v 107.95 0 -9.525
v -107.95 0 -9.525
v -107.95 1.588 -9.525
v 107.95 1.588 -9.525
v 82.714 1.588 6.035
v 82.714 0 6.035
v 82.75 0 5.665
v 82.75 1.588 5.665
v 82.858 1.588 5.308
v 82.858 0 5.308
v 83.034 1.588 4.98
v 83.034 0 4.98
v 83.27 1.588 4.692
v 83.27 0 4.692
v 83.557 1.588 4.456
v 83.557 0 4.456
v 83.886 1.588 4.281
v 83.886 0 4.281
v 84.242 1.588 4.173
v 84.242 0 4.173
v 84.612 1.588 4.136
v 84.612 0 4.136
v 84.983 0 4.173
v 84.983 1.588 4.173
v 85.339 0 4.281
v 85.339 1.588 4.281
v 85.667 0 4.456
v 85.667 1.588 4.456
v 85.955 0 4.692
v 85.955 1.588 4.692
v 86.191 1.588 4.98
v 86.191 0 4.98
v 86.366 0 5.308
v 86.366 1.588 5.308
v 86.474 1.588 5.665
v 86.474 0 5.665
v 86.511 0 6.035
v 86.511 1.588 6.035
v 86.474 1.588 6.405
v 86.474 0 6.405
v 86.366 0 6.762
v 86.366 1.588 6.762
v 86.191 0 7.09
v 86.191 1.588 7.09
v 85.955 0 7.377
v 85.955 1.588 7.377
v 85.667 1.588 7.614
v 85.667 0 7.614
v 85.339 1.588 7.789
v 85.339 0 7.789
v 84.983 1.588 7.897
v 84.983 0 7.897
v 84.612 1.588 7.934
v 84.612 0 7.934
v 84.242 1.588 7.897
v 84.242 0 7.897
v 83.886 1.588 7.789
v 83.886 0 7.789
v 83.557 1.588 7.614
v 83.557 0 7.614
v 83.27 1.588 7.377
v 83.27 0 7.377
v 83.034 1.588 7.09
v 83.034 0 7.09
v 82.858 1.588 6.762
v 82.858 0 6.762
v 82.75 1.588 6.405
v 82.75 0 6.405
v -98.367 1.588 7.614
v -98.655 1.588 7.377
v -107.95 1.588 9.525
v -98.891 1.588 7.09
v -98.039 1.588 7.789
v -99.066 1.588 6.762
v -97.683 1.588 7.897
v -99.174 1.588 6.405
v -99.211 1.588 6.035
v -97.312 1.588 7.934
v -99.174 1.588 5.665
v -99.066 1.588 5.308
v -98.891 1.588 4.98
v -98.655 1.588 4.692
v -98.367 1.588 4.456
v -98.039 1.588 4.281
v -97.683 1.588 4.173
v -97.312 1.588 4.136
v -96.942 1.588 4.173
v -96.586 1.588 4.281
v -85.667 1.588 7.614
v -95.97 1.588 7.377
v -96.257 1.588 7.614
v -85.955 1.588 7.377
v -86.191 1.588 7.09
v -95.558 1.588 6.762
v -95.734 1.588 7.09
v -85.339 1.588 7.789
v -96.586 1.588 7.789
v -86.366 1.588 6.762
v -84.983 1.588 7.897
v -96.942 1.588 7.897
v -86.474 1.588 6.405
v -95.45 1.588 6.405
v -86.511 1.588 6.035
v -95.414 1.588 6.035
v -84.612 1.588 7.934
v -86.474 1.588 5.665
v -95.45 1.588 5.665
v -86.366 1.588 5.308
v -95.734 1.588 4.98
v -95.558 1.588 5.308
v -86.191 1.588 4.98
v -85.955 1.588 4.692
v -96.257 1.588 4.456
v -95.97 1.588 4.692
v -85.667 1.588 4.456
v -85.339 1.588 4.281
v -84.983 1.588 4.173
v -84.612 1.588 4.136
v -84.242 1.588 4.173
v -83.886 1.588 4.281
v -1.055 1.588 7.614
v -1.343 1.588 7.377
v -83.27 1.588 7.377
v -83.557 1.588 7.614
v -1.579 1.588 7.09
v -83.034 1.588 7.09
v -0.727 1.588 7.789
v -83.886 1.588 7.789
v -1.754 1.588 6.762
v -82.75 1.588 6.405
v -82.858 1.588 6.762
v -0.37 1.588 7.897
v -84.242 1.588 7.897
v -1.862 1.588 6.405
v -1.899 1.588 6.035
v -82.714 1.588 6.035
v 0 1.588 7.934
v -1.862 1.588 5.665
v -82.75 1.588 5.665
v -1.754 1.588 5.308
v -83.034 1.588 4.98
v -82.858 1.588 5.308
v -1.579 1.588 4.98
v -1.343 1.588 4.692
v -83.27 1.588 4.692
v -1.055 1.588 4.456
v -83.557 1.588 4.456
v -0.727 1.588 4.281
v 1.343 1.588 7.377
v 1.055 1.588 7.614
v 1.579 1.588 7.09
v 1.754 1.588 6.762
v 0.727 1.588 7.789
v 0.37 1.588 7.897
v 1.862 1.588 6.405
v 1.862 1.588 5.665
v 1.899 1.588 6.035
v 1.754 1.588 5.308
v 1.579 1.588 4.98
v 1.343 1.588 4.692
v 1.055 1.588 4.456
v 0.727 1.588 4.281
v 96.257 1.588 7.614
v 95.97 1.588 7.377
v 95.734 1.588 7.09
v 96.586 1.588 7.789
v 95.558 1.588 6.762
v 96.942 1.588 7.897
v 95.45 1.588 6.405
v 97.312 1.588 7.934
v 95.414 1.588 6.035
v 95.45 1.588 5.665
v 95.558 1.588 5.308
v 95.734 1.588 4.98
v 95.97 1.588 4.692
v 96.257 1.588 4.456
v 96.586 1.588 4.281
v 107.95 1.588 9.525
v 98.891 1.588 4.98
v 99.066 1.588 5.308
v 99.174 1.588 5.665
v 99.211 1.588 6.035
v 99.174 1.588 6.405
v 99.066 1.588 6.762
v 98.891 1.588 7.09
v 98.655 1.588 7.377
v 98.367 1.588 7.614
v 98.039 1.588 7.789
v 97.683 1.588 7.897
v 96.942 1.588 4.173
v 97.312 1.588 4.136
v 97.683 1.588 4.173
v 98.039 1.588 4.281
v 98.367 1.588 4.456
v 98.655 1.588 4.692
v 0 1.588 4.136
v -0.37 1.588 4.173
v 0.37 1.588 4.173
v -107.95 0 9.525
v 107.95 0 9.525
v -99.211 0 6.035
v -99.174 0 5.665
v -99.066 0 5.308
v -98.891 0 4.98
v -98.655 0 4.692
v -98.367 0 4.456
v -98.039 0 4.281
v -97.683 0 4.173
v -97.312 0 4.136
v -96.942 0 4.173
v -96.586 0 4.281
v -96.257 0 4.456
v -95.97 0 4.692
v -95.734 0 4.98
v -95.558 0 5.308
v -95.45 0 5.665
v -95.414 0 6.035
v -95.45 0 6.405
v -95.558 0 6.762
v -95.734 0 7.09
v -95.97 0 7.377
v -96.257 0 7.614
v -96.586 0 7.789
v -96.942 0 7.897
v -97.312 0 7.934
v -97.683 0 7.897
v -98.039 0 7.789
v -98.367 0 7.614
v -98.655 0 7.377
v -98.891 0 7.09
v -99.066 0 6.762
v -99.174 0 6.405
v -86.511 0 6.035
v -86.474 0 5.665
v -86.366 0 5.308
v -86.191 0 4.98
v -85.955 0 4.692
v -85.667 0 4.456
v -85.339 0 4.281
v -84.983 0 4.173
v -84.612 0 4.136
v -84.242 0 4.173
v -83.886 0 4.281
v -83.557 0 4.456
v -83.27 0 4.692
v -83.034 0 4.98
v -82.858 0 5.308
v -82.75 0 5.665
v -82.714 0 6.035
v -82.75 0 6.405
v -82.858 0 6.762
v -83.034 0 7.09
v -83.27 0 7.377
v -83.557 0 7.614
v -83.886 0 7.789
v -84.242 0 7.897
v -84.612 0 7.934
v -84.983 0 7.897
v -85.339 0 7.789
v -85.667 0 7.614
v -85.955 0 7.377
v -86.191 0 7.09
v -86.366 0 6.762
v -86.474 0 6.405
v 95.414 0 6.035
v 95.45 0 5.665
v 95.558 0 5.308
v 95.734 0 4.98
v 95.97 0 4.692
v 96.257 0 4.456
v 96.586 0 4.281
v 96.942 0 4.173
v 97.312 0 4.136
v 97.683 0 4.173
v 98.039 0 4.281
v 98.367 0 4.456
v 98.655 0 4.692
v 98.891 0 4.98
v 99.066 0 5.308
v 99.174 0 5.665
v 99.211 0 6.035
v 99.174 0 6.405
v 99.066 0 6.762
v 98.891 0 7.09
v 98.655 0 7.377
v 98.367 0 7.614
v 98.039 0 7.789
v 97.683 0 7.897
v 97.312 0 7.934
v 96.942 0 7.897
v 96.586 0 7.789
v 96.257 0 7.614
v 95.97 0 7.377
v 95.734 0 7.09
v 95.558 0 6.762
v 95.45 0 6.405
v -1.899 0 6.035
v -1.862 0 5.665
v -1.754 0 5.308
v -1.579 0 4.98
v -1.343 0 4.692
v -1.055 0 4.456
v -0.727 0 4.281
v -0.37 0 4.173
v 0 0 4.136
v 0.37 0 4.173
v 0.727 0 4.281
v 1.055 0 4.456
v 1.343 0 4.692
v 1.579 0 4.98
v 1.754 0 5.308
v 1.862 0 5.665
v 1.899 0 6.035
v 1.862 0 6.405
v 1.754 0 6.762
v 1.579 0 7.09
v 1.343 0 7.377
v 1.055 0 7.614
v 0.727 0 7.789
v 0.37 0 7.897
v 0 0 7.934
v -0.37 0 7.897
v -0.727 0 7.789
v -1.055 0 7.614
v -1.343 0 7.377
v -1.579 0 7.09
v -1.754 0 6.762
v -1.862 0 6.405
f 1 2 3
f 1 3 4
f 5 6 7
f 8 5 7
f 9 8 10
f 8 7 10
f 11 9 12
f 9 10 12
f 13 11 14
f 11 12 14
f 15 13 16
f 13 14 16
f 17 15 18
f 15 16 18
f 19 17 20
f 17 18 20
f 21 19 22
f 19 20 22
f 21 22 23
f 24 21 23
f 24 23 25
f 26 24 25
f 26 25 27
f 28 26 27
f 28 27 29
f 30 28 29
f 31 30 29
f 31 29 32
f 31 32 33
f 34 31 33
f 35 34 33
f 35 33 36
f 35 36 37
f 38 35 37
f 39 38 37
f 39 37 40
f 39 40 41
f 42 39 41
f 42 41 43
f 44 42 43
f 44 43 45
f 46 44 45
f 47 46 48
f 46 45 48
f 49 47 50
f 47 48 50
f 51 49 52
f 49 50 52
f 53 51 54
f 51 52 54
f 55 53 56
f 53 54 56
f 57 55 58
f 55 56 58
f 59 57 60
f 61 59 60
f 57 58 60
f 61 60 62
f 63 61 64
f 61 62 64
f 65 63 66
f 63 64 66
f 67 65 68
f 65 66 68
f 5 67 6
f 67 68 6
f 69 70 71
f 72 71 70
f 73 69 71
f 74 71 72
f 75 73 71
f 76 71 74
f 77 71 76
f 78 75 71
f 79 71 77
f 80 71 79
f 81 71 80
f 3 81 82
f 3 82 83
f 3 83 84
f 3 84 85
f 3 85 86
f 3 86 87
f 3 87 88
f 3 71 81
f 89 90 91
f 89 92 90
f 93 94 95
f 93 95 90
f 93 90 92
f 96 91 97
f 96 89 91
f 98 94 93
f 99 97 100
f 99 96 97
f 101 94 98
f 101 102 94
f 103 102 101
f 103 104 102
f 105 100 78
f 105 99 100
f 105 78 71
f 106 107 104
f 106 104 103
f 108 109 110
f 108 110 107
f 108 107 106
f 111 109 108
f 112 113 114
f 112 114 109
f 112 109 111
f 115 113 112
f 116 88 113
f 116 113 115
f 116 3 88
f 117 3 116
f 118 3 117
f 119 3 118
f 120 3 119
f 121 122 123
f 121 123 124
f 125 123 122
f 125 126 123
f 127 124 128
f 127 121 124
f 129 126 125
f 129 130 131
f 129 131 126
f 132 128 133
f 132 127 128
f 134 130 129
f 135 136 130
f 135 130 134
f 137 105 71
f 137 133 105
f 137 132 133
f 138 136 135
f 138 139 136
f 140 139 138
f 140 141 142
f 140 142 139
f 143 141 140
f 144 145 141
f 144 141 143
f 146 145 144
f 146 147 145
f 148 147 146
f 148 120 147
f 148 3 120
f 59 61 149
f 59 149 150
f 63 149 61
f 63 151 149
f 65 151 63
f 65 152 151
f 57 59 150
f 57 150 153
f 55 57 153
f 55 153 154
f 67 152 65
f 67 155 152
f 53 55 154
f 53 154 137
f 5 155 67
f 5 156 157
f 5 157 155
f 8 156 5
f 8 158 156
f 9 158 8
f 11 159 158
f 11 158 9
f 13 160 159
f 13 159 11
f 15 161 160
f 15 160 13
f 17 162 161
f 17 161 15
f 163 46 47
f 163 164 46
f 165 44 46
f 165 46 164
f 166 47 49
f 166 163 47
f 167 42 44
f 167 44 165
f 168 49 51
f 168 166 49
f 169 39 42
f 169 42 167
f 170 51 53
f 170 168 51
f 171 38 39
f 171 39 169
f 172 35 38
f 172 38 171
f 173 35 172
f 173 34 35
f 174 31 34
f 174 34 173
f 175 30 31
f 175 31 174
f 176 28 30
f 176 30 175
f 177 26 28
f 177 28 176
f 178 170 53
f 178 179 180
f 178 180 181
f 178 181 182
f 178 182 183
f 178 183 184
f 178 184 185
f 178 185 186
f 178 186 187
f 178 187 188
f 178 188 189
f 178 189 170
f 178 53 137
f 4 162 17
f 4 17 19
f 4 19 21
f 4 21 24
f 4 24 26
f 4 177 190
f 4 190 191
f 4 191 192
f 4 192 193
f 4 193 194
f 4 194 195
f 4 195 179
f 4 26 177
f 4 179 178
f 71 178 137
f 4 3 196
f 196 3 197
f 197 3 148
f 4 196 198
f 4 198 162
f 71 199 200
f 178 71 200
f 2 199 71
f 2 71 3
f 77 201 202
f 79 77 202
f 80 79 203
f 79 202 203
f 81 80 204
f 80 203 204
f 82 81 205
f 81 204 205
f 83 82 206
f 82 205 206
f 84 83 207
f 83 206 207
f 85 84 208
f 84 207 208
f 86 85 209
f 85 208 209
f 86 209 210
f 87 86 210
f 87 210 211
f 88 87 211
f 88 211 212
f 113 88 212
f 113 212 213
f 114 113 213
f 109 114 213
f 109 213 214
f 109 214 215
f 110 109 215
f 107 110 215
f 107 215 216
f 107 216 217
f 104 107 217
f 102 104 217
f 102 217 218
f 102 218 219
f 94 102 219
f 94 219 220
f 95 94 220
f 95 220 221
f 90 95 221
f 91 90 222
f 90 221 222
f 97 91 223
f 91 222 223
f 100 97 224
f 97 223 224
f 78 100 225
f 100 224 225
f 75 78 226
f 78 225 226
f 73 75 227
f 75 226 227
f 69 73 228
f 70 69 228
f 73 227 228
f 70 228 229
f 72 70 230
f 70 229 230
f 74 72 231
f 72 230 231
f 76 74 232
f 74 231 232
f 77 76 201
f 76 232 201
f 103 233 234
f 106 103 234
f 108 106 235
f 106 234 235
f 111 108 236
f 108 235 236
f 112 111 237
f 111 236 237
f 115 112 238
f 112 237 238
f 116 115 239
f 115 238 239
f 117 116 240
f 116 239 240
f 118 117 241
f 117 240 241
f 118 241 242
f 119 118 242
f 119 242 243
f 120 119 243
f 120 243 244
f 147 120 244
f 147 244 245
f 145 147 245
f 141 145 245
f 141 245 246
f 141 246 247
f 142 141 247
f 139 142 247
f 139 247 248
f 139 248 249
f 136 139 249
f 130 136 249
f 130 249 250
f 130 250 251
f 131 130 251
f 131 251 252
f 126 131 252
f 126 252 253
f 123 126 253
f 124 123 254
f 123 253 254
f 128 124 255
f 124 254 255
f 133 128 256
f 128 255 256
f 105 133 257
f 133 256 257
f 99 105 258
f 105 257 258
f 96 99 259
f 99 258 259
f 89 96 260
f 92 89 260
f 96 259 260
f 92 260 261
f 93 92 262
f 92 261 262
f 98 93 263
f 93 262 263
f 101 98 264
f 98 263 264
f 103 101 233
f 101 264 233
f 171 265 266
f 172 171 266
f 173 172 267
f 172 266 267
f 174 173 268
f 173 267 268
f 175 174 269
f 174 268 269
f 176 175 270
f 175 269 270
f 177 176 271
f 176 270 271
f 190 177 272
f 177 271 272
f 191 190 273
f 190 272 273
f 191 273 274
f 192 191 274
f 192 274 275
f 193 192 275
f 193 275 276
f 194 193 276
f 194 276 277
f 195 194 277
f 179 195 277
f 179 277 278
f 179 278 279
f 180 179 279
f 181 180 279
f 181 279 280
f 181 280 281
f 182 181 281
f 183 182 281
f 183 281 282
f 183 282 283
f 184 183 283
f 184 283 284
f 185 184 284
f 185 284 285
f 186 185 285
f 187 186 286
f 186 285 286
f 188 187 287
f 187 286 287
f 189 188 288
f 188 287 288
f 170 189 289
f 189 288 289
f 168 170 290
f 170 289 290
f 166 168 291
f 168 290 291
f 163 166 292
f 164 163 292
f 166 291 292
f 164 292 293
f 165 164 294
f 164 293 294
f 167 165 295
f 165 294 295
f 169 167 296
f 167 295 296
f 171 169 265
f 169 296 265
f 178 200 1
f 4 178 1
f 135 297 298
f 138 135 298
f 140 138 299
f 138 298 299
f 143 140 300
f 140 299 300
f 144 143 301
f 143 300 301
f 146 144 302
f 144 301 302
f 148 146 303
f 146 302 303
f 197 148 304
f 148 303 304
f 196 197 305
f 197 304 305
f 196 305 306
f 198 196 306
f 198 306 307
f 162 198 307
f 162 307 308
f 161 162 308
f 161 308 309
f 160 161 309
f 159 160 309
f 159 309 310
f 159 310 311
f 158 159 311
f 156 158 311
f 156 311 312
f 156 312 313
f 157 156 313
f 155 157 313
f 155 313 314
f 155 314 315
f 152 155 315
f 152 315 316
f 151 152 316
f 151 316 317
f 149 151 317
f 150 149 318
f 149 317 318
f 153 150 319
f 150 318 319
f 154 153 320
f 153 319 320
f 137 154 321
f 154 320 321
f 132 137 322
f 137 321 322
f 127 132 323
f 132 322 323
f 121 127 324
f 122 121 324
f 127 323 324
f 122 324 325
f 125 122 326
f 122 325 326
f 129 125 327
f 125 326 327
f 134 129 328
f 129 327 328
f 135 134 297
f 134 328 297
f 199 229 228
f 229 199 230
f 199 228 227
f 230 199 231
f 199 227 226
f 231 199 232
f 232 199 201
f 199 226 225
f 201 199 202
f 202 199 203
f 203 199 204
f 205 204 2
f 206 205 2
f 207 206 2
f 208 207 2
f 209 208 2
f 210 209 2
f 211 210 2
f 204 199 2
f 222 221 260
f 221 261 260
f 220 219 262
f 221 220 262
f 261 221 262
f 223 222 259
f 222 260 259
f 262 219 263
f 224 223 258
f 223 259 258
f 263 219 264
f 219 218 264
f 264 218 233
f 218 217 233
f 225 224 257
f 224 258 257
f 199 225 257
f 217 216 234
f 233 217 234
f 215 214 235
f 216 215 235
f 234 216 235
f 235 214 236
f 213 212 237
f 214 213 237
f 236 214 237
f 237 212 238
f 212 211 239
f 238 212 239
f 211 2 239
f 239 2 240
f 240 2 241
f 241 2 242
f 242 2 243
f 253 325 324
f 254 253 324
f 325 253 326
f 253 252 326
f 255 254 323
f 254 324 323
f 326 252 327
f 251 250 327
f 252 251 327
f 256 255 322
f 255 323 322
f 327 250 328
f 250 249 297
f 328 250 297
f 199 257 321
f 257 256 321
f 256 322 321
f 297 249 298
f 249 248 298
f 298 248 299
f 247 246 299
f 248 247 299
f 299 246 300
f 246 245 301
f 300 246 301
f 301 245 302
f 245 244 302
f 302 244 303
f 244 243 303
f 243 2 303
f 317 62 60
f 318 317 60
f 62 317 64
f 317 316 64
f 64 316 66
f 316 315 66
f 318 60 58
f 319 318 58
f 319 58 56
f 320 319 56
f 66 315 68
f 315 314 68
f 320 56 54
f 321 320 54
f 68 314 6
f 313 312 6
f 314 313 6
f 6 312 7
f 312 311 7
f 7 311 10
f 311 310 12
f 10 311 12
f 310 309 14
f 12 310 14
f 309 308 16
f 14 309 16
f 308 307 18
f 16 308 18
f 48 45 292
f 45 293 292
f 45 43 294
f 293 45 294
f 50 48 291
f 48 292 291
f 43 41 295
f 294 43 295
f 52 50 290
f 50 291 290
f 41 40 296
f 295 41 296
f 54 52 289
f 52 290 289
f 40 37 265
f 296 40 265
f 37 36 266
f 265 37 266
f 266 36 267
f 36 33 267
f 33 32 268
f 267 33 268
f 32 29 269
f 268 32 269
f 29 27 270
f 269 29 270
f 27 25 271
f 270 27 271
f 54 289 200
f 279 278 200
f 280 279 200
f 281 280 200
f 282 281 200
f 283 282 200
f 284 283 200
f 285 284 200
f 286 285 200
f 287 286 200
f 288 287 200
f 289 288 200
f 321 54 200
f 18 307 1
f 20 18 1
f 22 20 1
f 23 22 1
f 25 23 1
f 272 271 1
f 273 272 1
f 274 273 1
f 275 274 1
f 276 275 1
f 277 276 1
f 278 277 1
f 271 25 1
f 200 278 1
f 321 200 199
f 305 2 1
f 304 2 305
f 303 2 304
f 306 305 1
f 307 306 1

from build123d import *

# Parameters (mm, degrees)
SKETCH2_W             = 215.9
SKETCH2_H             = 19.05
BOSS_EXTRUDE1_DEPTH   = 1.5875
F_6_CLEARANCE_HOLE1_D = 3.7973


with BuildPart() as part:
    # Sketch2 → Boss-Extrude1 (new body)
    with BuildSketch(Plane(origin=(0, 0, 0), x_dir=(1, 0, 0), z_dir=(0, 1, 0))):
        Rectangle(SKETCH2_W, SKETCH2_H)
    extrude(amount=BOSS_EXTRUDE1_DEPTH)

    # #6 Clearance Hole1 (through all)
    with Locations(Plane(origin=(0, 1.5875, 0), x_dir=(1, 0, 0), z_dir=(0, 1, 0))):
        with Locations((-97.31223666, -6.034928337), (0, -6.034928337), (97.31223666, -6.034928337), (-84.61223666, -6.034928337), (84.61223666, -6.034928337)):
            Hole(F_6_CLEARANCE_HOLE1_D / 2)


solid = part.part
